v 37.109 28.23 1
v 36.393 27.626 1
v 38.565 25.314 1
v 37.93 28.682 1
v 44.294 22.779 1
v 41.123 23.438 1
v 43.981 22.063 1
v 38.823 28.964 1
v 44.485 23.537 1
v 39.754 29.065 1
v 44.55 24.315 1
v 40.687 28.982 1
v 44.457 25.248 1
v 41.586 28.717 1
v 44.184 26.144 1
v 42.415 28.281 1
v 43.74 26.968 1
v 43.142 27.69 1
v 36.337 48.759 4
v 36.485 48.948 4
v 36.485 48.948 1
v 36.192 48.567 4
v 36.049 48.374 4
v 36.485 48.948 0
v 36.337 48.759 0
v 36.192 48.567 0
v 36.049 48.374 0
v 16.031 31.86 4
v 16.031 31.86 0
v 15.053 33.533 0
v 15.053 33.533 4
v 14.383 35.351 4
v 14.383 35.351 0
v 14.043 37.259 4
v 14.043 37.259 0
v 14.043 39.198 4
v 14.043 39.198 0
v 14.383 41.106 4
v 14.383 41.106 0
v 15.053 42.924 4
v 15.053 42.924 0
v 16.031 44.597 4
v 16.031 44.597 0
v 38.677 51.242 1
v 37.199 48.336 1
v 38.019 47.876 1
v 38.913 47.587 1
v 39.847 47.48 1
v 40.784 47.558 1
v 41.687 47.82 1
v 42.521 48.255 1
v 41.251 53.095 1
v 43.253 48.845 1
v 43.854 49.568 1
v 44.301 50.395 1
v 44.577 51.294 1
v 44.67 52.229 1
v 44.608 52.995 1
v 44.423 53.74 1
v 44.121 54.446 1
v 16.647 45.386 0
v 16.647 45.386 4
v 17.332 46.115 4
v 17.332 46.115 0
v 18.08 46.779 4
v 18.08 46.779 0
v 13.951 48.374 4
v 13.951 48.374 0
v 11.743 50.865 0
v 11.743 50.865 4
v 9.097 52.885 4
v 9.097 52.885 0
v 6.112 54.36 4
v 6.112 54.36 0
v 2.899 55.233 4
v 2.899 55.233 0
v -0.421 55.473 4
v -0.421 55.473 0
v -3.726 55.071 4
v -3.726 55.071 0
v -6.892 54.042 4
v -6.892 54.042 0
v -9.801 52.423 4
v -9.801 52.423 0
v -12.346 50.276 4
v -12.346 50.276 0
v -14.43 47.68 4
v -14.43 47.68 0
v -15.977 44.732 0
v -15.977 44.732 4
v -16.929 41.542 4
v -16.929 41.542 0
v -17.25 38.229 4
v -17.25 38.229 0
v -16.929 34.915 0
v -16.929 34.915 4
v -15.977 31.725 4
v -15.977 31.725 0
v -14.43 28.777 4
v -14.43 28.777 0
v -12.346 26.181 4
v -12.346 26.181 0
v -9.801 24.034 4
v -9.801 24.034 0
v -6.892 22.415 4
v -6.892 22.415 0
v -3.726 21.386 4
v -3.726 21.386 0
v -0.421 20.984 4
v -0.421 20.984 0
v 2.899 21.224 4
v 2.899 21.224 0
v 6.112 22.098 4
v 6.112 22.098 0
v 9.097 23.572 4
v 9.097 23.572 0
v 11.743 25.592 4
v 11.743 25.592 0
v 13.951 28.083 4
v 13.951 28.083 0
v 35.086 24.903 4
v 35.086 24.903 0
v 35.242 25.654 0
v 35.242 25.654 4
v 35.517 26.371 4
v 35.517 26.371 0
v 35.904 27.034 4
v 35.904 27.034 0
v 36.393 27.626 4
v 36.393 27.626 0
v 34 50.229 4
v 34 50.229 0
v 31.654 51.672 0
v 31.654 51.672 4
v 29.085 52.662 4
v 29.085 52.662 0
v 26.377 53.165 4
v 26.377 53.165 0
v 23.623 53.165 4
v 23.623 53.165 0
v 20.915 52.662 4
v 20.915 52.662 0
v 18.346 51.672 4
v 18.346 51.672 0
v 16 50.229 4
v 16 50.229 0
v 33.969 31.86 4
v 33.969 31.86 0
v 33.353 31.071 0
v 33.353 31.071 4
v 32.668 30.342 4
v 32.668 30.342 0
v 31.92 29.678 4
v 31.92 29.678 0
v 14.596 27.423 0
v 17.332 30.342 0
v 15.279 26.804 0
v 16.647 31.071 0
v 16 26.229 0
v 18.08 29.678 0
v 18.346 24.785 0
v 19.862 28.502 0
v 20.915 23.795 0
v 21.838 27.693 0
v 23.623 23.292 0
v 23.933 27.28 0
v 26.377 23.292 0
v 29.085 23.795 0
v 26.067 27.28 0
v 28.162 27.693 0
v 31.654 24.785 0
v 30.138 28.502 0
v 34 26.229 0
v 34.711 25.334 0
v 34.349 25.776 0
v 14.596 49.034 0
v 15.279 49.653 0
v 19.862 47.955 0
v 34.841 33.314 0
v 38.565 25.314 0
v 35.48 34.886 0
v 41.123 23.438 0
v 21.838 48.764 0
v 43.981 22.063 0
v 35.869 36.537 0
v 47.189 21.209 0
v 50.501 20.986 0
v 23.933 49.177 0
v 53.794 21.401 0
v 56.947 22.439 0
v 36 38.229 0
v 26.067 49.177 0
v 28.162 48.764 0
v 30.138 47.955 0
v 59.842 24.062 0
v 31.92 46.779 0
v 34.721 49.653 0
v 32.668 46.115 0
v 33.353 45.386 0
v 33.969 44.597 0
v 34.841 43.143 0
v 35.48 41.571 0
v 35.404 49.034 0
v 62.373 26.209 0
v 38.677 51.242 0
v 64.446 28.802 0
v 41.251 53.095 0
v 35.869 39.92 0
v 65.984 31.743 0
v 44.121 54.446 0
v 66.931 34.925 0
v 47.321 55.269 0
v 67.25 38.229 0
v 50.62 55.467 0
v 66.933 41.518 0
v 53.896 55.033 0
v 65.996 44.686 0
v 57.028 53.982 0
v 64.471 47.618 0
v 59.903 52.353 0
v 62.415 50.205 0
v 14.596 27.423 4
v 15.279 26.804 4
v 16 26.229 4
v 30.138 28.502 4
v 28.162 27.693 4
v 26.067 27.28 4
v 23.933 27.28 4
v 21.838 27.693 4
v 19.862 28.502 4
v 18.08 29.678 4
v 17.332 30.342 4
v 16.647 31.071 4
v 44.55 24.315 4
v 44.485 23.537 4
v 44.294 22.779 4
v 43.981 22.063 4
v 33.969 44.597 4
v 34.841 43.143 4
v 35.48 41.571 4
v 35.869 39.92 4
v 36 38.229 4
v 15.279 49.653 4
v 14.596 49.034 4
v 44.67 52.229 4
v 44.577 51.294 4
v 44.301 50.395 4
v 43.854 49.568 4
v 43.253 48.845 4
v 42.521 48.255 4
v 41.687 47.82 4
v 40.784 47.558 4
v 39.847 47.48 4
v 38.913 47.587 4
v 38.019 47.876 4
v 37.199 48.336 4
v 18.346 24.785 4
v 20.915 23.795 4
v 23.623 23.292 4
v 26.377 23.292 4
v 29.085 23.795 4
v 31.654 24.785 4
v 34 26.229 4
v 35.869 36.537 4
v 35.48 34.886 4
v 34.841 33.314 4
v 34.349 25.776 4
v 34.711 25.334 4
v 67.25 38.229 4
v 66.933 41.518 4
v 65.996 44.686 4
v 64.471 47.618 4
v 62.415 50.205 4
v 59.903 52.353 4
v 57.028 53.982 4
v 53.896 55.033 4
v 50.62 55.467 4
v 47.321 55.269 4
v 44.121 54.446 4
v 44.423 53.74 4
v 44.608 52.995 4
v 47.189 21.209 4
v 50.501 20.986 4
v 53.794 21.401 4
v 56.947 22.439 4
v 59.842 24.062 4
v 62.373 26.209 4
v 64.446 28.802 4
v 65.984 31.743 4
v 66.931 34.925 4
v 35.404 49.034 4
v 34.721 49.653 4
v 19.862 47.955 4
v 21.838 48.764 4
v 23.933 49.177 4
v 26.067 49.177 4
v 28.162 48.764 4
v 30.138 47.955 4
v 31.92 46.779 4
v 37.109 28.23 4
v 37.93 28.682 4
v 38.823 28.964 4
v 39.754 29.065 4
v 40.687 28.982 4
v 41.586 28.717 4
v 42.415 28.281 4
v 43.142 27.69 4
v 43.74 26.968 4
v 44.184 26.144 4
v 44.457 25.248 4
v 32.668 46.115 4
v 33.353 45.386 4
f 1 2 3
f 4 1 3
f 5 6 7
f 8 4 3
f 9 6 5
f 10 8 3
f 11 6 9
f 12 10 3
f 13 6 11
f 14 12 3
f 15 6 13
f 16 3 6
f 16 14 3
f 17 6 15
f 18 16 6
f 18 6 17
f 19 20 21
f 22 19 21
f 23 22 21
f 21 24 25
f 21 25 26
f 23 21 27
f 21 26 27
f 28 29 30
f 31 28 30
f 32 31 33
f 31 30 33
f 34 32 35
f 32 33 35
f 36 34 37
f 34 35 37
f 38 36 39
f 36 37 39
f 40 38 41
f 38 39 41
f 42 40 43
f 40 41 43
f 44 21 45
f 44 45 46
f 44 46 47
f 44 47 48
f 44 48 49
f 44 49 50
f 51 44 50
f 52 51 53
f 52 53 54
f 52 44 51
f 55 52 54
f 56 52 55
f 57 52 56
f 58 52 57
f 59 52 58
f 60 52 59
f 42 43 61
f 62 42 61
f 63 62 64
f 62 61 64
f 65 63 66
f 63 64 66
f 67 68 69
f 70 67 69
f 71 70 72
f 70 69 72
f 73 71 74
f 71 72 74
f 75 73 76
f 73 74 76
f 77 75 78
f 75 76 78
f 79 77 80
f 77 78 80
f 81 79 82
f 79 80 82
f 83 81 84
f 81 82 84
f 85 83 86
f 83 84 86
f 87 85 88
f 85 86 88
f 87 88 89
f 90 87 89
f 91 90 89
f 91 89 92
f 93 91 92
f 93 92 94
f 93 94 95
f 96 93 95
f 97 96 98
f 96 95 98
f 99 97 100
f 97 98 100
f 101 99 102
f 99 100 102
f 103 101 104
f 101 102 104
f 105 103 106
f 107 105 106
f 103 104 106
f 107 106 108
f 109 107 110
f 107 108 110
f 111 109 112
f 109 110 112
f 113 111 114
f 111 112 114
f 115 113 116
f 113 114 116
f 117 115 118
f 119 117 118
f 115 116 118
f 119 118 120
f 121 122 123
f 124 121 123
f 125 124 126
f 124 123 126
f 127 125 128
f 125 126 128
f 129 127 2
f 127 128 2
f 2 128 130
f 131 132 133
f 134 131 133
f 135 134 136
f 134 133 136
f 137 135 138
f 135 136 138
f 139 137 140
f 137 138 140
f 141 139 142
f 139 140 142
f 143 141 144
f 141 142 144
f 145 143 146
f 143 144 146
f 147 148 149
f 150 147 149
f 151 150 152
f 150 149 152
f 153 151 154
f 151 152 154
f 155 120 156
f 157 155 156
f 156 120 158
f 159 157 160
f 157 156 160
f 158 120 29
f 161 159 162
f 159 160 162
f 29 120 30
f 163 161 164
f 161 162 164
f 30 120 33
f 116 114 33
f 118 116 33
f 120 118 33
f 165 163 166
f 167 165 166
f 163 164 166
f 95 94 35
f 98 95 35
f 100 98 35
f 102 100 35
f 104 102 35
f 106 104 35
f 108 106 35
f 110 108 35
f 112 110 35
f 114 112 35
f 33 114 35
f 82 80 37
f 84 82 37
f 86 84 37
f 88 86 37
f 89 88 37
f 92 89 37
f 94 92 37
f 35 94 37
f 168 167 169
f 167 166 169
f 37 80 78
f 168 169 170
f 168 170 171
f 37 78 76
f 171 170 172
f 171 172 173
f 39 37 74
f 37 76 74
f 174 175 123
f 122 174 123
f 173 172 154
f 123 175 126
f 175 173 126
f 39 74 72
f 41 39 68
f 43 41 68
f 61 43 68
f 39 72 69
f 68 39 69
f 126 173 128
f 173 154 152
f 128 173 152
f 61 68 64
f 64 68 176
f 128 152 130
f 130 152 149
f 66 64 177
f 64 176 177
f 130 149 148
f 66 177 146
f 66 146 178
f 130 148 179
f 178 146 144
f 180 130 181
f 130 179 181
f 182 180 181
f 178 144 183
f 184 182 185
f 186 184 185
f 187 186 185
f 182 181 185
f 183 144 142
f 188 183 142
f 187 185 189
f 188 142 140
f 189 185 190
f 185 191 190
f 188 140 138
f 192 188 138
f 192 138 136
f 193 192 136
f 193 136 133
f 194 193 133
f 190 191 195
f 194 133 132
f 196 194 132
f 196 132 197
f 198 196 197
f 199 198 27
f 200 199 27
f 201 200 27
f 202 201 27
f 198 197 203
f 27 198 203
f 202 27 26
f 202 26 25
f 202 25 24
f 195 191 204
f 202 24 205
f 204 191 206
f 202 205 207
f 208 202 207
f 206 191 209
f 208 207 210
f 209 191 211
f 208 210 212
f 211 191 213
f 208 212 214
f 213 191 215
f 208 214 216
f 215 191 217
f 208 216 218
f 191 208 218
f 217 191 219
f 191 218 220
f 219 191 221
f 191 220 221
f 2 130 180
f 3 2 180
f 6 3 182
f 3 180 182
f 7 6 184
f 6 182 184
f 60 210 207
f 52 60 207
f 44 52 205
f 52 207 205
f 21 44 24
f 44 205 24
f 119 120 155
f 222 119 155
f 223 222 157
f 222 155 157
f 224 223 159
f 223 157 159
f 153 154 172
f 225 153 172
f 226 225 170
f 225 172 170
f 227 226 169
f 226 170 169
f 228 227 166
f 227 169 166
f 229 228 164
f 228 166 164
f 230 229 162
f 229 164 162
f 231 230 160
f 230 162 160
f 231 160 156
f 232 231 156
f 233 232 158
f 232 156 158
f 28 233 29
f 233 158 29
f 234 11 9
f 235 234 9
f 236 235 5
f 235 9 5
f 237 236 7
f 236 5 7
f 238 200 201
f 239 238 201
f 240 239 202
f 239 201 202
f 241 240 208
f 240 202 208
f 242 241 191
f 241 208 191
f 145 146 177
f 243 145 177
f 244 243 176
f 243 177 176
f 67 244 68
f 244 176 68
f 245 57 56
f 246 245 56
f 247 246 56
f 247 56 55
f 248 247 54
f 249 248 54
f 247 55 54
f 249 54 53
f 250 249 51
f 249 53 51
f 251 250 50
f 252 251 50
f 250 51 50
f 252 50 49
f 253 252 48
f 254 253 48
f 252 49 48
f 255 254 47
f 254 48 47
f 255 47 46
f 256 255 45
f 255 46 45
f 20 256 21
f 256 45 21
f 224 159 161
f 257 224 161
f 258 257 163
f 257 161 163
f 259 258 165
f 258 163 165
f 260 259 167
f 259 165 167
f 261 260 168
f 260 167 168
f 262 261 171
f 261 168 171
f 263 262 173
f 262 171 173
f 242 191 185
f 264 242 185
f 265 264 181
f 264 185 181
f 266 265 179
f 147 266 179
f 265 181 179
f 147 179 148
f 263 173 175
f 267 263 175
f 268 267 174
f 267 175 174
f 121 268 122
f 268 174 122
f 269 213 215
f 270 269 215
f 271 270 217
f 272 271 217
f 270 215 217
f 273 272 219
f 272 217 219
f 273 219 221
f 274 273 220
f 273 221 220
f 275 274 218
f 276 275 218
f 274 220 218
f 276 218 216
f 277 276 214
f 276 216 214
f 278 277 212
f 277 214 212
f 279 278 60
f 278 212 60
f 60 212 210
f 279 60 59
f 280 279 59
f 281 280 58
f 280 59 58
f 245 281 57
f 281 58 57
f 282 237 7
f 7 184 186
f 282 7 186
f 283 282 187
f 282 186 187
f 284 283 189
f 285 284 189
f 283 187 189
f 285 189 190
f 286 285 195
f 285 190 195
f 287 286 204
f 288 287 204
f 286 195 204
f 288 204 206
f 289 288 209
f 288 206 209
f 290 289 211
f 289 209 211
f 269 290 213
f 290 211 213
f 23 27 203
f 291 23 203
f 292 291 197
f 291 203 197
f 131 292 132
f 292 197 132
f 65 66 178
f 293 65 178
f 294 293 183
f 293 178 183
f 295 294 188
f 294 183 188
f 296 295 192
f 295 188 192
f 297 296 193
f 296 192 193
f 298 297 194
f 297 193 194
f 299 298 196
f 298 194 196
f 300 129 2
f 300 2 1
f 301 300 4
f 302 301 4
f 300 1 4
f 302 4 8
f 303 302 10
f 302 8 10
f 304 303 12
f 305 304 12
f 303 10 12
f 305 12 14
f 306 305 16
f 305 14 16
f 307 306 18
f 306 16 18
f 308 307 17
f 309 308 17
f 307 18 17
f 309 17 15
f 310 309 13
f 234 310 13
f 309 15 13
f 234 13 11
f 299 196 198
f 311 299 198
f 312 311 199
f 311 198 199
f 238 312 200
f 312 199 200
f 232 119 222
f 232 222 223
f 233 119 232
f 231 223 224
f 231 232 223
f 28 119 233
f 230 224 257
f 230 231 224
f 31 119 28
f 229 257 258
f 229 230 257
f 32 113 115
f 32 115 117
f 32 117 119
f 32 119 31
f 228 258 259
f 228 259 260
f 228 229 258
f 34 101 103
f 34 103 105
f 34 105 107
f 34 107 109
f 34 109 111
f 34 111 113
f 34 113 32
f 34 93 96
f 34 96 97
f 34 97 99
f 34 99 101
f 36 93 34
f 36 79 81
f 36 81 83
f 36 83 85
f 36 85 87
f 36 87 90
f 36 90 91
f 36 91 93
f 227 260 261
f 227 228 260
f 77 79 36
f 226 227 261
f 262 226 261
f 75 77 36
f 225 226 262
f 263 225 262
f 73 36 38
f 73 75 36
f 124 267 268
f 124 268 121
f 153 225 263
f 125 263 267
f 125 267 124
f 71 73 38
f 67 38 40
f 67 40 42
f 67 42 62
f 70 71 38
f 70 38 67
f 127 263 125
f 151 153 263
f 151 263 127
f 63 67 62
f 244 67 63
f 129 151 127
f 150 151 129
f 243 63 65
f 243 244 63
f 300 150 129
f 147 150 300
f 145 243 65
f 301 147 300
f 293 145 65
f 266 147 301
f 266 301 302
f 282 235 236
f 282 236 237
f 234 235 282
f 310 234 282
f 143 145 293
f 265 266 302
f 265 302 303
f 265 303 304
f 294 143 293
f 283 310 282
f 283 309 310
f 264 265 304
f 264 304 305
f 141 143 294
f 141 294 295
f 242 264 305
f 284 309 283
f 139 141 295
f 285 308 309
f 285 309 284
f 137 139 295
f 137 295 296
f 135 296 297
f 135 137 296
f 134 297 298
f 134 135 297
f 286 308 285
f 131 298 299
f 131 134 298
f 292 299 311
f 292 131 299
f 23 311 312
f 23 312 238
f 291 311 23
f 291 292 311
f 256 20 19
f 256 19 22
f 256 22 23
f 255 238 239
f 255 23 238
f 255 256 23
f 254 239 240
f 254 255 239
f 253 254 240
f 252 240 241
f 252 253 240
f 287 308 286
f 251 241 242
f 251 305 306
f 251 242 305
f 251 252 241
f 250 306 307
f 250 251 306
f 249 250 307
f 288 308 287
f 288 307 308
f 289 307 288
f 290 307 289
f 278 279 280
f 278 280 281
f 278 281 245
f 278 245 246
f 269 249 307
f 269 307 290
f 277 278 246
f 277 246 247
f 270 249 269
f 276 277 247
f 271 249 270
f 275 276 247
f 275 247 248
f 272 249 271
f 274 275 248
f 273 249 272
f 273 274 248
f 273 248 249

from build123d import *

# Parameters (mm, degrees)
F1_DEPTH = 4
F2_DEPTH = 1


# Not quite as in the source:
# - a feature names something its author has since deleted; it is built from what else it names


with BuildPart() as f1:
    # F0 (on Top) → F1 (new body)
    with BuildSketch(Plane.XY):
        with BuildLine():
            ThreePointArc((33.96875, 44.5973311111), (35.4798914594, 41.5709736662), (36, 38.228538177))
            ThreePointArc((36, 38.228538177), (35.4798914594, 34.8861026877), (33.96875, 31.8597452428))
            ThreePointArc((33.96875, 31.8597452428), (34.890304672, 29.9063024739), (36.04875, 28.083336186))
            ThreePointArc((36.04875, 28.083336186), (38.9773253879, 32.7847917648), (40, 38.228538177))
            ThreePointArc((40, 38.228538177), (38.9773253879, 43.6722845891), (36.04875, 48.3737401679))
            ThreePointArc((36.04875, 48.3737401679), (34.890304672, 46.55077388), (33.96875, 44.5973311111))
        make_face()
        with BuildLine():
            ThreePointArc((31.92, 46.7791872751), (33.0189287452, 45.7582647177), (33.96875, 44.5973311111))
            ThreePointArc((33.96875, 44.5973311111), (34.890304672, 46.55077388), (36.04875, 48.3737401679))
            ThreePointArc((36.04875, 48.3737401679), (35.0671824784, 49.3484229311), (34, 50.228538177))
            ThreePointArc((34, 50.228538177), (32.8729423014, 48.5563595633), (31.92, 46.7791872751))
        make_face()
        with BuildLine():
            ThreePointArc((36.04875, 28.083336186), (34.890304672, 29.9063024739), (33.96875, 31.8597452428))
            ThreePointArc((33.96875, 31.8597452428), (33.0189287452, 30.6988116362), (31.92, 29.6778890788))
            ThreePointArc((31.92, 29.6778890788), (32.8729423014, 27.9007167906), (34, 26.228538177))
            ThreePointArc((34, 26.228538177), (35.0671824784, 27.1086534228), (36.04875, 28.083336186))
        make_face()
        with BuildLine():
            ThreePointArc((18.08, 46.7791872751), (25, 49.228538177), (31.92, 46.7791872751))
            ThreePointArc((31.92, 46.7791872751), (32.8729423014, 48.5563595633), (34, 50.228538177))
            ThreePointArc((34, 50.228538177), (25, 53.228538177), (16, 50.228538177))
            ThreePointArc((16, 50.228538177), (17.1270576986, 48.5563595633), (18.08, 46.7791872751))
        make_face()
        with BuildLine():
            ThreePointArc((36.4851682331, 48.9482313775), (36.2639553749, 48.6632675964), (36.04875, 48.3737401679))
            ThreePointArc((36.04875, 48.3737401679), (38.9773253879, 43.6722845891), (40, 38.228538177))
            ThreePointArc((40, 38.228538177), (38.9773253879, 32.7847917648), (36.04875, 28.083336186))
            ThreePointArc((36.04875, 28.083336186), (36.2190453875, 27.853192883), (36.3931368718, 27.6259075689))
            ThreePointArc((36.3931368718, 27.6259075689), (41.5858805009, 28.7167510128), (44.5495147975, 24.3154560246))
            ThreePointArc((44.5495147975, 24.3154560246), (44.4052654508, 23.1537499865), (43.9812786211, 22.062601985))
            ThreePointArc((43.9812786211, 22.062601985), (59.8422445665, 24.0619323063), (67.25, 38.228538177))
            ThreePointArc((67.25, 38.228538177), (59.9032981891, 52.3525314146), (44.1210510171, 54.4458270643))
            ThreePointArc((44.1210510171, 54.4458270643), (44.5307176941, 53.3709710002), (44.6699958357, 52.2291549274))
            ThreePointArc((44.6699958357, 52.2291549274), (41.6873482182, 47.8201907003), (36.4851682331, 48.9482313775))
        make_face()
        with BuildLine():
            ThreePointArc((50, 45.978538177), (55.4800775542, 43.7086157311), (57.75, 38.228538177))
            ThreePointArc((57.75, 38.228538177), (44.5199224458, 32.7484606228), (50, 45.978538177))
        make_face(mode=Mode.SUBTRACT)
        with BuildLine():
            ThreePointArc((34, 26.228538177), (32.8729423014, 27.9007167906), (31.92, 29.6778890788))
            ThreePointArc((31.92, 29.6778890788), (25, 27.228538177), (18.08, 29.6778890788))
            ThreePointArc((18.08, 29.6778890788), (17.1270576986, 27.9007167906), (16, 26.228538177))
            ThreePointArc((16, 26.228538177), (25, 23.228538177), (34, 26.228538177))
        make_face()
        with BuildLine():
            ThreePointArc((36.3931368718, 27.6259075689), (36.2190453875, 27.853192883), (36.04875, 28.083336186))
            ThreePointArc((36.04875, 28.083336186), (35.0671824784, 27.1086534228), (34, 26.228538177))
            ThreePointArc((34, 26.228538177), (34.528786958, 25.5540927449), (35.0859826327, 24.9029205189))
            ThreePointArc((35.0859826327, 24.9029205189), (35.517354176, 26.3710825501), (36.3931368718, 27.6259075689))
        make_face()
        with BuildLine():
            ThreePointArc((16.03125, 44.5973311111), (16.9810712548, 45.7582647177), (18.08, 46.7791872751))
            ThreePointArc((18.08, 46.7791872751), (17.1270576986, 48.5563595633), (16, 50.228538177))
            ThreePointArc((16, 50.228538177), (14.9328175216, 49.3484229311), (13.95125, 48.3737401679))
            ThreePointArc((13.95125, 48.3737401679), (15.109695328, 46.55077388), (16.03125, 44.5973311111))
        make_face()
        with BuildLine():
            ThreePointArc((16, 26.228538177), (17.1270576986, 27.9007167906), (18.08, 29.6778890788))
            ThreePointArc((18.08, 29.6778890788), (16.9810712548, 30.6988116362), (16.03125, 31.8597452428))
            ThreePointArc((16.03125, 31.8597452428), (15.109695328, 29.9063024739), (13.95125, 28.083336186))
            ThreePointArc((13.95125, 28.083336186), (14.9328175216, 27.1086534228), (16, 26.228538177))
        make_face()
        with BuildLine():
            ThreePointArc((16.03125, 31.8597452428), (14, 38.228538177), (16.03125, 44.5973311111))
            ThreePointArc((16.03125, 44.5973311111), (15.109695328, 46.55077388), (13.95125, 48.3737401679))
            ThreePointArc((13.95125, 48.3737401679), (10, 38.228538177), (13.95125, 28.083336186))
            ThreePointArc((13.95125, 28.083336186), (15.109695328, 29.9063024739), (16.03125, 31.8597452428))
        make_face()
        with BuildLine():
            ThreePointArc((13.95125, 28.083336186), (10, 38.228538177), (13.95125, 48.3737401679))
            ThreePointArc((13.95125, 48.3737401679), (-17.25, 38.228538177), (13.95125, 28.083336186))
        make_face()
        with BuildLine():
            ThreePointArc((0, 45.978538177), (5.4800775542, 43.7086157311), (7.75, 38.228538177))
            ThreePointArc((7.75, 38.228538177), (-5.4800775542, 32.7484606228), (0, 45.978538177))
        make_face(mode=Mode.SUBTRACT)
        with BuildLine():
            ThreePointArc((0, 45.978538177), (-5.4800775542, 32.7484606228), (7.75, 38.228538177))
            ThreePointArc((7.75, 38.228538177), (5.4800775542, 43.7086157311), (0, 45.978538177))
        make_face()
        with BuildLine():
            ThreePointArc((50, 45.978538177), (44.5199224458, 32.7484606228), (57.75, 38.228538177))
            ThreePointArc((57.75, 38.228538177), (55.4800775542, 43.7086157311), (50, 45.978538177))
        make_face()
    extrude(amount=F1_DEPTH)

    # F0 (on Top) → F2 (join)
    with BuildSketch(Plane.XY):
        with BuildLine():
            ThreePointArc((44.1210510171, 54.4458270643), (39.9210331617, 52.2277141339), (36.4851682331, 48.9482313775))
            ThreePointArc((36.4851682331, 48.9482313775), (41.6873482182, 47.8201907003), (44.6699958357, 52.2291549274))
            ThreePointArc((44.6699958357, 52.2291549274), (44.5307176941, 53.3709710002), (44.1210510171, 54.4458270643))
        make_face()
        with BuildLine():
            ThreePointArc((44.5495147975, 24.3154560246), (41.5858805009, 28.7167510128), (36.3931368718, 27.6259075689))
            ThreePointArc((36.3931368718, 27.6259075689), (39.8005645222, 24.31688781), (43.9812786211, 22.062601985))
            ThreePointArc((43.9812786211, 22.062601985), (44.4052654508, 23.1537499865), (44.5495147975, 24.3154560246))
        make_face()
    extrude(amount=F2_DEPTH)


solid = f1.part
